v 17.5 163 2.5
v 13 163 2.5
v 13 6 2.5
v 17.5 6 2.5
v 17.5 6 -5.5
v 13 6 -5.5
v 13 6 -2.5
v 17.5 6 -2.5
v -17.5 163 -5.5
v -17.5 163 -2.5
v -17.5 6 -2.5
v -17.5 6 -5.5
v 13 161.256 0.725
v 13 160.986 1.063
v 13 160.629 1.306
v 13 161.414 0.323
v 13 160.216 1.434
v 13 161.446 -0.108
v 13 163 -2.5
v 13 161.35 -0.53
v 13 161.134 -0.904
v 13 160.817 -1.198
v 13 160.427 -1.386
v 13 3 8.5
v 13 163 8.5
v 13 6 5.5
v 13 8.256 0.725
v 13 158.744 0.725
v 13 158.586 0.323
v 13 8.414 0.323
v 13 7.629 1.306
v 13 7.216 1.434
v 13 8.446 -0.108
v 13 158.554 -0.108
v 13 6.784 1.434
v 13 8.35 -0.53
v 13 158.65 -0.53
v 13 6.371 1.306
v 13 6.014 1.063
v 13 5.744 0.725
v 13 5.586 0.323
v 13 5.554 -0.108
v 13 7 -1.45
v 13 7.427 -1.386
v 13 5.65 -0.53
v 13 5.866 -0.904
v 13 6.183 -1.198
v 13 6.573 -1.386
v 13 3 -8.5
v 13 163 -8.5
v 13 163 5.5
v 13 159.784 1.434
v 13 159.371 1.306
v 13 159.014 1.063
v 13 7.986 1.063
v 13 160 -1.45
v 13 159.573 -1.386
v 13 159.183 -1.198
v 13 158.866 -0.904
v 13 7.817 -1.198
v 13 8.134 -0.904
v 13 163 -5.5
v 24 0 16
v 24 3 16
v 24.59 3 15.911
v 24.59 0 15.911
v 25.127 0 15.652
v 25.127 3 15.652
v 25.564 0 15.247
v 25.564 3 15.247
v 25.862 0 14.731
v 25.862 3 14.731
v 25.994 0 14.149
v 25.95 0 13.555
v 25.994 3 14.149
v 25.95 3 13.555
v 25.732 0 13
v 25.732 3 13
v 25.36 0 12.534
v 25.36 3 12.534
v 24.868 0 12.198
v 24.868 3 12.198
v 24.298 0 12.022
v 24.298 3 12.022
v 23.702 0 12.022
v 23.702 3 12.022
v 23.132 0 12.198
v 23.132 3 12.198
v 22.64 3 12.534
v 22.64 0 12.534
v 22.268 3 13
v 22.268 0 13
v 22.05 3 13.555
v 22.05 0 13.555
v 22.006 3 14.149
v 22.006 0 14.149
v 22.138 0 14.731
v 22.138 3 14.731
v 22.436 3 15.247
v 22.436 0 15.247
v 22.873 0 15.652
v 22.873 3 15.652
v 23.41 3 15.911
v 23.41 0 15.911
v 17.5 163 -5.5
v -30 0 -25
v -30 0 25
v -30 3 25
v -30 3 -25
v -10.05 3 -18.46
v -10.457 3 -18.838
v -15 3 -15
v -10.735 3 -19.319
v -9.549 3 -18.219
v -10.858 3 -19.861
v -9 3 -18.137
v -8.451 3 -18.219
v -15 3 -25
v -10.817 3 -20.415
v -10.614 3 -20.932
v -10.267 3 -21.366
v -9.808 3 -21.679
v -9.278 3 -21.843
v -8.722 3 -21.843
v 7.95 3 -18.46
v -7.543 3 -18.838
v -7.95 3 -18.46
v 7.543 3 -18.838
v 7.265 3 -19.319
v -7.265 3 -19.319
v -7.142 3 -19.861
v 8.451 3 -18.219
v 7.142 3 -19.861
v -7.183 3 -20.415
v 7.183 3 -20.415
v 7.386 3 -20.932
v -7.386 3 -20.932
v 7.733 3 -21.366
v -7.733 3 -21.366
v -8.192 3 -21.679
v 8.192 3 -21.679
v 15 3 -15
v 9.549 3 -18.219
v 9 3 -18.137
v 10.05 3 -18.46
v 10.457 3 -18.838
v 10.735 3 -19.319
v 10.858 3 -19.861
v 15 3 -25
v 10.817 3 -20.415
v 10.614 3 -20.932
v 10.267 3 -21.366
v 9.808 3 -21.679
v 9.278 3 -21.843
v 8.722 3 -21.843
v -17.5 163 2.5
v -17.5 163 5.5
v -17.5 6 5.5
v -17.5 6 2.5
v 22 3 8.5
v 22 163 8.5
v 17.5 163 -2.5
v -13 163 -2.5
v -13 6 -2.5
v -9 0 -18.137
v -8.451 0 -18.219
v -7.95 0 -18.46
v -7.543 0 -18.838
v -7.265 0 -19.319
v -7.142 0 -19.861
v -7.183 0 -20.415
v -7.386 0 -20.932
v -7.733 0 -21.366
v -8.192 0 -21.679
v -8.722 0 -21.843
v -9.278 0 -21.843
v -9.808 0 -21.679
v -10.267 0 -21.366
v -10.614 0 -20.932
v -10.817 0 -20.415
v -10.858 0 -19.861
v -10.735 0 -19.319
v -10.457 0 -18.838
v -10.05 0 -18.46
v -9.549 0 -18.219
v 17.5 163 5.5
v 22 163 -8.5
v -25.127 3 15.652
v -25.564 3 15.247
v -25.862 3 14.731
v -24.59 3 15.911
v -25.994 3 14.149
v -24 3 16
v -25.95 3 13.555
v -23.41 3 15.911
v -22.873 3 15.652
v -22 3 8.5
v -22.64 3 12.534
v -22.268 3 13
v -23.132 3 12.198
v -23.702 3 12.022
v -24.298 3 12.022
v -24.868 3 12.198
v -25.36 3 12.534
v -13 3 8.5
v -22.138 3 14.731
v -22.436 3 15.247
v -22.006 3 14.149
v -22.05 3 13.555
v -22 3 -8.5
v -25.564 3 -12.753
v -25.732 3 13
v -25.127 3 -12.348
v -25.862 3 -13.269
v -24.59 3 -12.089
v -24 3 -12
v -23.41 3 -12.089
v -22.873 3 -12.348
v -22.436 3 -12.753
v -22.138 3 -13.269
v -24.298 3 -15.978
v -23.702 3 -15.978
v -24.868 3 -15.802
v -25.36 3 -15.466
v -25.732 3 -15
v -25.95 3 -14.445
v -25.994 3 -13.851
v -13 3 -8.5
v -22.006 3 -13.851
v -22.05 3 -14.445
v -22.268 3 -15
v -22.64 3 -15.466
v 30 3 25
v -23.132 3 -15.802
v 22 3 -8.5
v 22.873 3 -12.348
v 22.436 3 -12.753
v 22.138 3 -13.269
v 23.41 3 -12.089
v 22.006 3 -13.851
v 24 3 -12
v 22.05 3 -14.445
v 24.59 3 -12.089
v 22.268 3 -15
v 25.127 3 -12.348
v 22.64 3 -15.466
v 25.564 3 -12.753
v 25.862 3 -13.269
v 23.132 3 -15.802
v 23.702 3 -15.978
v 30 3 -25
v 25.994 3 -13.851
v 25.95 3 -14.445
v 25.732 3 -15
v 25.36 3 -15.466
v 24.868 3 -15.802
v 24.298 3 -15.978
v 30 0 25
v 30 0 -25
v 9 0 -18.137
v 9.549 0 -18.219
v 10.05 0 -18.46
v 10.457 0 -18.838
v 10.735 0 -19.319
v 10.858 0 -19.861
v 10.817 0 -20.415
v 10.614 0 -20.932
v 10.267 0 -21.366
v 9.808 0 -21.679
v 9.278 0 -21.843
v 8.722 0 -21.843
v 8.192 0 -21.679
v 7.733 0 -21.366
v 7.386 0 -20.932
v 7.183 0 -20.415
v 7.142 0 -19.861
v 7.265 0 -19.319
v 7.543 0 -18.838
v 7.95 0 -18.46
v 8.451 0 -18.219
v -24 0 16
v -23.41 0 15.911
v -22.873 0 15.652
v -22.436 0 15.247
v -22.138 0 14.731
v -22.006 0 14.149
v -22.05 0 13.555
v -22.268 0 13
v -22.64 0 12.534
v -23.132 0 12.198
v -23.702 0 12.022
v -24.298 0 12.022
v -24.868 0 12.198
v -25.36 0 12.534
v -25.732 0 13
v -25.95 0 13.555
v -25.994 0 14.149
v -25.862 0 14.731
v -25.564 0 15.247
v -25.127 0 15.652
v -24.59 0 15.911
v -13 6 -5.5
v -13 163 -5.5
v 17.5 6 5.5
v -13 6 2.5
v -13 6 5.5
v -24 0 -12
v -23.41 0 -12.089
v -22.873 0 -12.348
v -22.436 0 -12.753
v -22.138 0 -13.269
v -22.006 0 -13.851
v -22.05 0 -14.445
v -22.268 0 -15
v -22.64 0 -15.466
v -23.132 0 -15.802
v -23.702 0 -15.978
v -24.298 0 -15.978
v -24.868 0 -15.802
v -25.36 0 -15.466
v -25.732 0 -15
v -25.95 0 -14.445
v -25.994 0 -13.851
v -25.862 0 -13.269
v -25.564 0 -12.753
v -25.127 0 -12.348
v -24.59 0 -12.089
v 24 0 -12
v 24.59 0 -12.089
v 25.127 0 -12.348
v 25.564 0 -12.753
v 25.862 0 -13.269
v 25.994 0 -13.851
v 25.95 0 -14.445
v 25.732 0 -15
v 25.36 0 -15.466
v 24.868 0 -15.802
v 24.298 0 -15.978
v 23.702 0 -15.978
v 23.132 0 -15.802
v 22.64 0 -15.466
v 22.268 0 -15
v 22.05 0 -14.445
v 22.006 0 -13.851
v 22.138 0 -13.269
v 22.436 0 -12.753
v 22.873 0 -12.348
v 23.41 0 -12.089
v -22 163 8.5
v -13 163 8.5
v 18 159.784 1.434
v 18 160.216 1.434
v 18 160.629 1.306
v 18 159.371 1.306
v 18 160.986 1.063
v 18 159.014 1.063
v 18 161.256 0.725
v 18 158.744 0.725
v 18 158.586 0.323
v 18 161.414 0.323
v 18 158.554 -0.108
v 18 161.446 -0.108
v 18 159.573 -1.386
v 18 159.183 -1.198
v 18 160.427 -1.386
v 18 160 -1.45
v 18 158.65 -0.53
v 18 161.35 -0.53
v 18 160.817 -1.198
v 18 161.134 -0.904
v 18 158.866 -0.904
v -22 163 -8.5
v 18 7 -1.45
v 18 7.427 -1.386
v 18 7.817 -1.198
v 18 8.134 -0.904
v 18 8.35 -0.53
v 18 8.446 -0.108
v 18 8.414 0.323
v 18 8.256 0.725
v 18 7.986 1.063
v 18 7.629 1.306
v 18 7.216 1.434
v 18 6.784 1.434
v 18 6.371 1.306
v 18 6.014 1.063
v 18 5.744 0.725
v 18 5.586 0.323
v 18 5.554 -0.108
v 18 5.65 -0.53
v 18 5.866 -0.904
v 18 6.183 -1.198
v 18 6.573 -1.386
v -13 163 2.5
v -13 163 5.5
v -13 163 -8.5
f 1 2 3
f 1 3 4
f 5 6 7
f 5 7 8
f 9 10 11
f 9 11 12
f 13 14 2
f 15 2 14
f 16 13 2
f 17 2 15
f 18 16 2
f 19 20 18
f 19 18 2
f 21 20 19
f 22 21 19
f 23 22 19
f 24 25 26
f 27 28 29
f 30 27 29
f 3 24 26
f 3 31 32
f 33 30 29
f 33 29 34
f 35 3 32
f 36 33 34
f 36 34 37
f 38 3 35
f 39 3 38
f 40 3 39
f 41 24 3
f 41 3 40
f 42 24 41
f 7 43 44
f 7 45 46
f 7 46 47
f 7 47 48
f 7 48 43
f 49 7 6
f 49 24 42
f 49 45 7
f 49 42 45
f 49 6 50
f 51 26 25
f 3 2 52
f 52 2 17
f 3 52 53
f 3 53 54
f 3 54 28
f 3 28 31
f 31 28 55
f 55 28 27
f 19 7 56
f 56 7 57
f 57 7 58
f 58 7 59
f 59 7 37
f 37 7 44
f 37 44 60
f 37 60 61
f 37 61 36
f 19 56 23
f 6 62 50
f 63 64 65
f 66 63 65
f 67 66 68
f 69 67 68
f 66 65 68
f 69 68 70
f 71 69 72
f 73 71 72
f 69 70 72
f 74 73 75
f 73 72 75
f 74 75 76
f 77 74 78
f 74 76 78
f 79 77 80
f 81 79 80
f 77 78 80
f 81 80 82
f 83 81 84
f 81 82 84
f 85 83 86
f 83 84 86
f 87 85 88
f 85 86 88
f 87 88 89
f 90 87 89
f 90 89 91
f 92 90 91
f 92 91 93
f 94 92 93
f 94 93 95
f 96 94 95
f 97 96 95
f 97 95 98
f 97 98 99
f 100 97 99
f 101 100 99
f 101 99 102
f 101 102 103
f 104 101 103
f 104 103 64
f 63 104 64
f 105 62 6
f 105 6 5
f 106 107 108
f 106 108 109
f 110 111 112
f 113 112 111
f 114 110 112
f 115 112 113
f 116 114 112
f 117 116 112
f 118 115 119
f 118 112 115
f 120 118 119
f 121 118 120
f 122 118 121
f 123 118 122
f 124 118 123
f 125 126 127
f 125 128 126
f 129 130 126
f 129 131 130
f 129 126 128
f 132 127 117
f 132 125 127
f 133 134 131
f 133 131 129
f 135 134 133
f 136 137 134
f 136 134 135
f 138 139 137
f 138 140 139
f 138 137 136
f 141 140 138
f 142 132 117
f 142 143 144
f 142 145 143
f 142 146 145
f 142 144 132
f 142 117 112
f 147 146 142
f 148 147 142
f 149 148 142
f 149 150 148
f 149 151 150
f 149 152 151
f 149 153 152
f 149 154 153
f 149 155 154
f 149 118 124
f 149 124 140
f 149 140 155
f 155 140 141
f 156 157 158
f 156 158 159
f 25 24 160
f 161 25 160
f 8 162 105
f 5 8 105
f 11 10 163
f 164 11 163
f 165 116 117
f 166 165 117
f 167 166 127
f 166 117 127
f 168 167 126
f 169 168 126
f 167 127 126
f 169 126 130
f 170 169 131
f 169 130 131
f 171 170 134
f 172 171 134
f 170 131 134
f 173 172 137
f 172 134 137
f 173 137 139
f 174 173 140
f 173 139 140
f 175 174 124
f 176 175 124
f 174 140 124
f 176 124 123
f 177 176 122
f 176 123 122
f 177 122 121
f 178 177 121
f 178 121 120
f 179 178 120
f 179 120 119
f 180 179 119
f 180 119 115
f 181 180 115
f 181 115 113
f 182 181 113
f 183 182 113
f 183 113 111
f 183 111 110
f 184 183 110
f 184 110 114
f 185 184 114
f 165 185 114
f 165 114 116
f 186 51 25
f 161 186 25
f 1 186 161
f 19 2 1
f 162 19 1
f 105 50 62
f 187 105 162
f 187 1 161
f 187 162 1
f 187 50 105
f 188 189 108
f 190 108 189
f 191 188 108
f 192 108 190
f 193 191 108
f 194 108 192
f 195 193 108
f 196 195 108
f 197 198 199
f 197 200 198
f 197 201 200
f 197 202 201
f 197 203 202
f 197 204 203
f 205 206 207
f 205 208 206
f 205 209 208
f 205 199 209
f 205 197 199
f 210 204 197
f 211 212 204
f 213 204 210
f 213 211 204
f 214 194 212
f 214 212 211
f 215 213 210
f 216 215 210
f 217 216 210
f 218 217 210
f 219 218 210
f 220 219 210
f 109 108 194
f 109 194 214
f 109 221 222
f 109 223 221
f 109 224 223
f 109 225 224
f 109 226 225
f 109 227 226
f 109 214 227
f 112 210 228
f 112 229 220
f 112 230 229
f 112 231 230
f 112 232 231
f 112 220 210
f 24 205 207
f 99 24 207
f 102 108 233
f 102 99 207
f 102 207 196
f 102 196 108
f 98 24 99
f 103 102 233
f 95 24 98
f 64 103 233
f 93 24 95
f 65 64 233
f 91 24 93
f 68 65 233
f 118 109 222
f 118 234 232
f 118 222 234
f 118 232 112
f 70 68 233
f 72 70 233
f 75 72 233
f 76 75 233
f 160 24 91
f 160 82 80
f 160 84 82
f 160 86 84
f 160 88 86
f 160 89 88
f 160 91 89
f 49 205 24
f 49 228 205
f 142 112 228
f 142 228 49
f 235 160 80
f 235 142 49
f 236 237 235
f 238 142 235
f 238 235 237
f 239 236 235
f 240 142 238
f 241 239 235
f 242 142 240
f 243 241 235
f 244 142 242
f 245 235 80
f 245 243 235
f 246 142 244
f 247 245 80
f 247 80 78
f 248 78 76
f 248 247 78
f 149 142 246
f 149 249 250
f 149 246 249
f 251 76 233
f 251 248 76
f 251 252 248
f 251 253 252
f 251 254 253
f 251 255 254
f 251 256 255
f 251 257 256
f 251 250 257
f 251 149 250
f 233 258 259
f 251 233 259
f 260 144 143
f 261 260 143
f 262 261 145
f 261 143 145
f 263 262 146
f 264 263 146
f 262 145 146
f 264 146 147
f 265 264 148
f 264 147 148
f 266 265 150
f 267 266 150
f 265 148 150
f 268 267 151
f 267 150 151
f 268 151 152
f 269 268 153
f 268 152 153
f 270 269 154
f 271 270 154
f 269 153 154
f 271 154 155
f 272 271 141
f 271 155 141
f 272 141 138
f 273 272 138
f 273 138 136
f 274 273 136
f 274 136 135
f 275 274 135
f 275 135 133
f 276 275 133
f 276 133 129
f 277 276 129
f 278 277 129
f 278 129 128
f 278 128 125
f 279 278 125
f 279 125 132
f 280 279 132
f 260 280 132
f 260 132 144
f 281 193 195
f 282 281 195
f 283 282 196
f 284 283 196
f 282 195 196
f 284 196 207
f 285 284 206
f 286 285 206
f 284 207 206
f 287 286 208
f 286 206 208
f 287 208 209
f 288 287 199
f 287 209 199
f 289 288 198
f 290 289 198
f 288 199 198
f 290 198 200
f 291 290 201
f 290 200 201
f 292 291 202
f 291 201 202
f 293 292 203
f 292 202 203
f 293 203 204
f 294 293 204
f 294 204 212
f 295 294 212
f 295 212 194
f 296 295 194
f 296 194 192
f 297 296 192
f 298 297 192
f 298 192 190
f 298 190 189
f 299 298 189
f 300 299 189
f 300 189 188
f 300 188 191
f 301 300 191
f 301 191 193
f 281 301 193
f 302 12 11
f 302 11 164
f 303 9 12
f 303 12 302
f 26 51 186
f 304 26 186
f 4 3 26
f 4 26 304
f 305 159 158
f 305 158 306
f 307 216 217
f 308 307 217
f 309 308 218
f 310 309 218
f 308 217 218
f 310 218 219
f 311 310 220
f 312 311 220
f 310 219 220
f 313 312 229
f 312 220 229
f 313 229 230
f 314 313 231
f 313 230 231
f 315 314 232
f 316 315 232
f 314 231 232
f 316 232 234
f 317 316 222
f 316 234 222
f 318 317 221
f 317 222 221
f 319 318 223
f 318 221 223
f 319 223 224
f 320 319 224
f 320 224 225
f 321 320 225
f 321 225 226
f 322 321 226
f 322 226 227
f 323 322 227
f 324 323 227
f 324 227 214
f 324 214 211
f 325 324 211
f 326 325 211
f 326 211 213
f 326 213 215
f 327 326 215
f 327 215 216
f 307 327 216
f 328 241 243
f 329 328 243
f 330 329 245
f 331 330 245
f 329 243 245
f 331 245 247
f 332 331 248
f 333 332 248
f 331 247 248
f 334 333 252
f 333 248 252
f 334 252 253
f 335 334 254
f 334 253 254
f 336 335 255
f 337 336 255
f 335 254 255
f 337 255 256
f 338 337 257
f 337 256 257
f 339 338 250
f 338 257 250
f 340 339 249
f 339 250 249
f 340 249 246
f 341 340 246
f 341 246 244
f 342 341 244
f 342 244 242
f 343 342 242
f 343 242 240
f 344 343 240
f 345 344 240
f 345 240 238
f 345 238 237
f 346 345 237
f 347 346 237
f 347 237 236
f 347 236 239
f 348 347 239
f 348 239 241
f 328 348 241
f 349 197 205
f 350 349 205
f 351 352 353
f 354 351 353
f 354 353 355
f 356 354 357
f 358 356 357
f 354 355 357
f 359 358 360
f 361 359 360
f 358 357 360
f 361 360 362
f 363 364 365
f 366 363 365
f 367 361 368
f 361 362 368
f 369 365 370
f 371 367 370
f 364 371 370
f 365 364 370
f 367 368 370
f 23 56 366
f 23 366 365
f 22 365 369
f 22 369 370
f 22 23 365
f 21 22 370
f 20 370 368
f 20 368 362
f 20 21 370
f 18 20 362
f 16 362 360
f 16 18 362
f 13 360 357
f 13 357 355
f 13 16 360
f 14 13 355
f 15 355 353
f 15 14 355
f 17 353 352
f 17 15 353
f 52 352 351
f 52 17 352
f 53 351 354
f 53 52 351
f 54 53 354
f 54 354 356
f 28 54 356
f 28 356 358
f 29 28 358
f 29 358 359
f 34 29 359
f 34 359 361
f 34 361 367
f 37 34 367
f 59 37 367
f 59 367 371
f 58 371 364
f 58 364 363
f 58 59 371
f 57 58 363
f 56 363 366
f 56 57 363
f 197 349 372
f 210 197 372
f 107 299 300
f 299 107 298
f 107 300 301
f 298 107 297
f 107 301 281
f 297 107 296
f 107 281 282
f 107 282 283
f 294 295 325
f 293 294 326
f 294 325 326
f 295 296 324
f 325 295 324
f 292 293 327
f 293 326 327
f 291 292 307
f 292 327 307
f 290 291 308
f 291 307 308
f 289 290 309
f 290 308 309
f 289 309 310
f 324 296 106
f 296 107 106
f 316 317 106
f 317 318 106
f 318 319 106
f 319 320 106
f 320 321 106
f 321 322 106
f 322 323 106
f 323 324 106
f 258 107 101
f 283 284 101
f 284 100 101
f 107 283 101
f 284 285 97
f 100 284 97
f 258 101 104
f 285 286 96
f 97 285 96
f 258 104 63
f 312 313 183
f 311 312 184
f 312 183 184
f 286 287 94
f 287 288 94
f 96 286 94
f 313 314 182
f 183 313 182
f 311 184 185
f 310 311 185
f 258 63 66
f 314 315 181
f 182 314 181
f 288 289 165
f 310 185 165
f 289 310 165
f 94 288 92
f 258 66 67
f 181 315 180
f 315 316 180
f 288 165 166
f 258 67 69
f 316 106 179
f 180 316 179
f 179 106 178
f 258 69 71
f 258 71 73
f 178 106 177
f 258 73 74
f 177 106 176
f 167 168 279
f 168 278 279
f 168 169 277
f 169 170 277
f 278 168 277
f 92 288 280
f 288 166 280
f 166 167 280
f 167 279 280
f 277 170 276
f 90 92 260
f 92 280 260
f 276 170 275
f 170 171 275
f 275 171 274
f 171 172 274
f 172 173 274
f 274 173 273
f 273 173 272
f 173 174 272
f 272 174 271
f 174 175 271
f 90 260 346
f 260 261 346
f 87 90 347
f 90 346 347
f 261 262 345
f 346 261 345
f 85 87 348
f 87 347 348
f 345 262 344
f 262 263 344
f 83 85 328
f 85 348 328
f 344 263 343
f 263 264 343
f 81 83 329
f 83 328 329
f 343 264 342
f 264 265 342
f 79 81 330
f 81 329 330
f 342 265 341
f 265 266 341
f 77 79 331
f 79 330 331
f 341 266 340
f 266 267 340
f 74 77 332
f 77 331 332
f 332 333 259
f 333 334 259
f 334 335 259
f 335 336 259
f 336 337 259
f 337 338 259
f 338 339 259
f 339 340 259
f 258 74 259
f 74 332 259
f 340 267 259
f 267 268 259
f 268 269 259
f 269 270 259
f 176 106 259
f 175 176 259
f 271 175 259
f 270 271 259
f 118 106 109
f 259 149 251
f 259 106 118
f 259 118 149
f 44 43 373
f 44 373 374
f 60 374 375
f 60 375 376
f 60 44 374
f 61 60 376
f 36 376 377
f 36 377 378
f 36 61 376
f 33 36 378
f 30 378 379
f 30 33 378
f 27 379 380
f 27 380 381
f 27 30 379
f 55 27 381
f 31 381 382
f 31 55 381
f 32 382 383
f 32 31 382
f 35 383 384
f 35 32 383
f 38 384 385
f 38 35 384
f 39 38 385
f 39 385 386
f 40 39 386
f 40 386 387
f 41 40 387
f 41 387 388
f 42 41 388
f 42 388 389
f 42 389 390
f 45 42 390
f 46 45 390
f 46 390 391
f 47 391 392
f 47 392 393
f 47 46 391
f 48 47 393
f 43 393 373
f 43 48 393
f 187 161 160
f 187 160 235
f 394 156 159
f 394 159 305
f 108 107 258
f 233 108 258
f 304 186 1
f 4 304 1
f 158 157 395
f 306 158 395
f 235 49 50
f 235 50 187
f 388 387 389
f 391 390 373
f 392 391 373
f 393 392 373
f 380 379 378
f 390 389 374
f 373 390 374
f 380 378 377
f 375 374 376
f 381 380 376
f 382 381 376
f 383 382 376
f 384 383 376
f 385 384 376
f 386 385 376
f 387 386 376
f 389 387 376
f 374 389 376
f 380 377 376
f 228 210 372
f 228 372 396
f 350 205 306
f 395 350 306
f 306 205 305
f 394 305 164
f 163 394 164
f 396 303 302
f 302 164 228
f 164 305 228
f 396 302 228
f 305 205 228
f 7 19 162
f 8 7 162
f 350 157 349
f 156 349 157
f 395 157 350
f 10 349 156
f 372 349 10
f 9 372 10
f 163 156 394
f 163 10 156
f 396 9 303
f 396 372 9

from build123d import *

# Parameters (mm, degrees)
SKETCH1_W           = 60
SKETCH1_H           = 50
BOSS_EXTRUDE1_DEPTH = 3
SKETCH2_W           = 9
SKETCH2_H           = 17
BOSS_EXTRUDE2_DEPTH = 160
SKETCH3_W           = 4.5
SKETCH3_H           = 3
CUT_EXTRUDE1_DEPTH  = 157
CUT_EXTRUDE2_START  = 26
SKETCH4_R           = 1.45
CUT_EXTRUDE2_DEPTH  = 5
CUT_EXTRUDE3_REACH  = 166.697
SKETCH5_R           = 2
SKETCH8_W           = 30
SKETCH8_H           = 10
BOSS_EXTRUDE3_DEPTH = 0.0001
CUT_EXTRUDE4_REACH  = 166.697
SKETCH9_R           = 1.863373193


with BuildPart() as part:
    # Sketch1 → Boss-Extrude1 (new body)
    with BuildSketch(Plane(origin=(0, 0, 0), x_dir=(1, 0, 0), z_dir=(0, 1, 0))):
        Rectangle(SKETCH1_W, SKETCH1_H)
    extrude(amount=BOSS_EXTRUDE1_DEPTH)

    # Sketch2 → Boss-Extrude2 (add)
    with BuildSketch(Plane(origin=(0, 3, 0), x_dir=(1, 0, 0), z_dir=(0, 1, 0))):
        with Locations((17.5, 0)):
            Rectangle(SKETCH2_W, SKETCH2_H)
        with Locations((-17.5, 0)):
            Rectangle(SKETCH2_W, SKETCH2_H)
    extrude(amount=BOSS_EXTRUDE2_DEPTH)

    # Sketch3 → Cut-Extrude1 (cut)
    with BuildSketch(Plane(origin=(0, 163, 0), x_dir=(1, 0, 0), z_dir=(0, 1, 0))):
        with Locations((-15.25, 4)):
            Rectangle(SKETCH3_W, SKETCH3_H)
        with Locations((-15.25, -4)):
            Rectangle(SKETCH3_W, SKETCH3_H)
        with Locations((15.25, -4)):
            Rectangle(SKETCH3_W, SKETCH3_H)
        with Locations((15.25, 4)):
            Rectangle(SKETCH3_W, SKETCH3_H)
    extrude(amount=-CUT_EXTRUDE1_DEPTH, mode=Mode.SUBTRACT)

    # Sketch4 → Cut-Extrude2 (cut)
    with BuildSketch(Plane(origin=(-13, 0, 0), x_dir=(0, 0, -1), z_dir=(1, 0, 0)).offset(CUT_EXTRUDE2_START)):
        with Locations((0, 7)):
            Circle(SKETCH4_R)
        with Locations((0, 160)):
            Circle(SKETCH4_R)
    extrude(amount=CUT_EXTRUDE2_DEPTH, mode=Mode.SUBTRACT)

    # Sketch5 → Cut-Extrude3 (cut, up to next)
    with BuildSketch(Plane(origin=(0, 3, 0), x_dir=(1, 0, 0), z_dir=(0, 1, 0)), mode=Mode.PRIVATE) as cut_extrude3_sk1:
        with Locations(Location((-24, 14, 0), (0, 0, 270))):
            Circle(SKETCH5_R)
    cut_extrude3_tool1 = extrude(cut_extrude3_sk1.sketch, amount=-CUT_EXTRUDE3_REACH, mode=Mode.PRIVATE) & part.part
    # Sketch5 → Cut-Extrude3 (cut, up to next)
    with BuildSketch(Plane(origin=(0, 3, 0), x_dir=(1, 0, 0), z_dir=(0, 1, 0)), mode=Mode.PRIVATE) as cut_extrude3_sk2:
        with Locations(Location((-24, -14, 0), (0, 0, 270))):
            Circle(SKETCH5_R)
    cut_extrude3_tool2 = extrude(cut_extrude3_sk2.sketch, amount=-CUT_EXTRUDE3_REACH, mode=Mode.PRIVATE) & part.part
    # Sketch5 → Cut-Extrude3 (cut, up to next)
    with BuildSketch(Plane(origin=(0, 3, 0), x_dir=(1, 0, 0), z_dir=(0, 1, 0)), mode=Mode.PRIVATE) as cut_extrude3_sk3:
        with Locations(Location((24, -14, 0), (0, 0, 270))):
            Circle(SKETCH5_R)
    cut_extrude3_tool3 = extrude(cut_extrude3_sk3.sketch, amount=-CUT_EXTRUDE3_REACH, mode=Mode.PRIVATE) & part.part
    # Sketch5 → Cut-Extrude3 (cut, up to next)
    with BuildSketch(Plane(origin=(0, 3, 0), x_dir=(1, 0, 0), z_dir=(0, 1, 0)), mode=Mode.PRIVATE) as cut_extrude3_sk4:
        with Locations(Location((24, 14, 0), (0, 0, 270))):
            Circle(SKETCH5_R)
    cut_extrude3_tool4 = extrude(cut_extrude3_sk4.sketch, amount=-CUT_EXTRUDE3_REACH, mode=Mode.PRIVATE) & part.part
    add(cut_extrude3_tool1.solids().sort_by_distance((-24, 3, -14))[0], mode=Mode.SUBTRACT)
    add(cut_extrude3_tool2.solids().sort_by_distance((-24, 3, 14))[0], mode=Mode.SUBTRACT)
    add(cut_extrude3_tool3.solids().sort_by_distance((24, 3, 14))[0], mode=Mode.SUBTRACT)
    add(cut_extrude3_tool4.solids().sort_by_distance((24, 3, -14))[0], mode=Mode.SUBTRACT)

    # Sketch8 → Boss-Extrude3 (add)
    with BuildSketch(Plane(origin=(0, 3, 0), x_dir=(1, 0, 0), z_dir=(0, 1, 0))):
        with Locations((0, 20)):
            Rectangle(SKETCH8_W, SKETCH8_H)
    extrude(amount=BOSS_EXTRUDE3_DEPTH)

    # Sketch9 → Cut-Extrude4 (cut, up to next)
    with BuildSketch(Plane(origin=(0, 3.0001, 0), x_dir=(1, 0, 0), z_dir=(0, 1, 0)), mode=Mode.PRIVATE) as cut_extrude4_sk1:
        with Locations(Location((-9, 20, 0), (0, 0, 270))):
            Circle(SKETCH9_R)
    cut_extrude4_tool1 = extrude(cut_extrude4_sk1.sketch, amount=-CUT_EXTRUDE4_REACH, mode=Mode.PRIVATE) & part.part
    # Sketch9 → Cut-Extrude4 (cut, up to next)
    with BuildSketch(Plane(origin=(0, 3.0001, 0), x_dir=(1, 0, 0), z_dir=(0, 1, 0)), mode=Mode.PRIVATE) as cut_extrude4_sk2:
        with Locations(Location((9, 20, 0), (0, 0, 270))):
            Circle(SKETCH9_R)
    cut_extrude4_tool2 = extrude(cut_extrude4_sk2.sketch, amount=-CUT_EXTRUDE4_REACH, mode=Mode.PRIVATE) & part.part
    add(cut_extrude4_tool1.solids().sort_by_distance((-9, 3.0001, -20))[0], mode=Mode.SUBTRACT)
    add(cut_extrude4_tool2.solids().sort_by_distance((9, 3.0001, -20))[0], mode=Mode.SUBTRACT)


solid = part.part
